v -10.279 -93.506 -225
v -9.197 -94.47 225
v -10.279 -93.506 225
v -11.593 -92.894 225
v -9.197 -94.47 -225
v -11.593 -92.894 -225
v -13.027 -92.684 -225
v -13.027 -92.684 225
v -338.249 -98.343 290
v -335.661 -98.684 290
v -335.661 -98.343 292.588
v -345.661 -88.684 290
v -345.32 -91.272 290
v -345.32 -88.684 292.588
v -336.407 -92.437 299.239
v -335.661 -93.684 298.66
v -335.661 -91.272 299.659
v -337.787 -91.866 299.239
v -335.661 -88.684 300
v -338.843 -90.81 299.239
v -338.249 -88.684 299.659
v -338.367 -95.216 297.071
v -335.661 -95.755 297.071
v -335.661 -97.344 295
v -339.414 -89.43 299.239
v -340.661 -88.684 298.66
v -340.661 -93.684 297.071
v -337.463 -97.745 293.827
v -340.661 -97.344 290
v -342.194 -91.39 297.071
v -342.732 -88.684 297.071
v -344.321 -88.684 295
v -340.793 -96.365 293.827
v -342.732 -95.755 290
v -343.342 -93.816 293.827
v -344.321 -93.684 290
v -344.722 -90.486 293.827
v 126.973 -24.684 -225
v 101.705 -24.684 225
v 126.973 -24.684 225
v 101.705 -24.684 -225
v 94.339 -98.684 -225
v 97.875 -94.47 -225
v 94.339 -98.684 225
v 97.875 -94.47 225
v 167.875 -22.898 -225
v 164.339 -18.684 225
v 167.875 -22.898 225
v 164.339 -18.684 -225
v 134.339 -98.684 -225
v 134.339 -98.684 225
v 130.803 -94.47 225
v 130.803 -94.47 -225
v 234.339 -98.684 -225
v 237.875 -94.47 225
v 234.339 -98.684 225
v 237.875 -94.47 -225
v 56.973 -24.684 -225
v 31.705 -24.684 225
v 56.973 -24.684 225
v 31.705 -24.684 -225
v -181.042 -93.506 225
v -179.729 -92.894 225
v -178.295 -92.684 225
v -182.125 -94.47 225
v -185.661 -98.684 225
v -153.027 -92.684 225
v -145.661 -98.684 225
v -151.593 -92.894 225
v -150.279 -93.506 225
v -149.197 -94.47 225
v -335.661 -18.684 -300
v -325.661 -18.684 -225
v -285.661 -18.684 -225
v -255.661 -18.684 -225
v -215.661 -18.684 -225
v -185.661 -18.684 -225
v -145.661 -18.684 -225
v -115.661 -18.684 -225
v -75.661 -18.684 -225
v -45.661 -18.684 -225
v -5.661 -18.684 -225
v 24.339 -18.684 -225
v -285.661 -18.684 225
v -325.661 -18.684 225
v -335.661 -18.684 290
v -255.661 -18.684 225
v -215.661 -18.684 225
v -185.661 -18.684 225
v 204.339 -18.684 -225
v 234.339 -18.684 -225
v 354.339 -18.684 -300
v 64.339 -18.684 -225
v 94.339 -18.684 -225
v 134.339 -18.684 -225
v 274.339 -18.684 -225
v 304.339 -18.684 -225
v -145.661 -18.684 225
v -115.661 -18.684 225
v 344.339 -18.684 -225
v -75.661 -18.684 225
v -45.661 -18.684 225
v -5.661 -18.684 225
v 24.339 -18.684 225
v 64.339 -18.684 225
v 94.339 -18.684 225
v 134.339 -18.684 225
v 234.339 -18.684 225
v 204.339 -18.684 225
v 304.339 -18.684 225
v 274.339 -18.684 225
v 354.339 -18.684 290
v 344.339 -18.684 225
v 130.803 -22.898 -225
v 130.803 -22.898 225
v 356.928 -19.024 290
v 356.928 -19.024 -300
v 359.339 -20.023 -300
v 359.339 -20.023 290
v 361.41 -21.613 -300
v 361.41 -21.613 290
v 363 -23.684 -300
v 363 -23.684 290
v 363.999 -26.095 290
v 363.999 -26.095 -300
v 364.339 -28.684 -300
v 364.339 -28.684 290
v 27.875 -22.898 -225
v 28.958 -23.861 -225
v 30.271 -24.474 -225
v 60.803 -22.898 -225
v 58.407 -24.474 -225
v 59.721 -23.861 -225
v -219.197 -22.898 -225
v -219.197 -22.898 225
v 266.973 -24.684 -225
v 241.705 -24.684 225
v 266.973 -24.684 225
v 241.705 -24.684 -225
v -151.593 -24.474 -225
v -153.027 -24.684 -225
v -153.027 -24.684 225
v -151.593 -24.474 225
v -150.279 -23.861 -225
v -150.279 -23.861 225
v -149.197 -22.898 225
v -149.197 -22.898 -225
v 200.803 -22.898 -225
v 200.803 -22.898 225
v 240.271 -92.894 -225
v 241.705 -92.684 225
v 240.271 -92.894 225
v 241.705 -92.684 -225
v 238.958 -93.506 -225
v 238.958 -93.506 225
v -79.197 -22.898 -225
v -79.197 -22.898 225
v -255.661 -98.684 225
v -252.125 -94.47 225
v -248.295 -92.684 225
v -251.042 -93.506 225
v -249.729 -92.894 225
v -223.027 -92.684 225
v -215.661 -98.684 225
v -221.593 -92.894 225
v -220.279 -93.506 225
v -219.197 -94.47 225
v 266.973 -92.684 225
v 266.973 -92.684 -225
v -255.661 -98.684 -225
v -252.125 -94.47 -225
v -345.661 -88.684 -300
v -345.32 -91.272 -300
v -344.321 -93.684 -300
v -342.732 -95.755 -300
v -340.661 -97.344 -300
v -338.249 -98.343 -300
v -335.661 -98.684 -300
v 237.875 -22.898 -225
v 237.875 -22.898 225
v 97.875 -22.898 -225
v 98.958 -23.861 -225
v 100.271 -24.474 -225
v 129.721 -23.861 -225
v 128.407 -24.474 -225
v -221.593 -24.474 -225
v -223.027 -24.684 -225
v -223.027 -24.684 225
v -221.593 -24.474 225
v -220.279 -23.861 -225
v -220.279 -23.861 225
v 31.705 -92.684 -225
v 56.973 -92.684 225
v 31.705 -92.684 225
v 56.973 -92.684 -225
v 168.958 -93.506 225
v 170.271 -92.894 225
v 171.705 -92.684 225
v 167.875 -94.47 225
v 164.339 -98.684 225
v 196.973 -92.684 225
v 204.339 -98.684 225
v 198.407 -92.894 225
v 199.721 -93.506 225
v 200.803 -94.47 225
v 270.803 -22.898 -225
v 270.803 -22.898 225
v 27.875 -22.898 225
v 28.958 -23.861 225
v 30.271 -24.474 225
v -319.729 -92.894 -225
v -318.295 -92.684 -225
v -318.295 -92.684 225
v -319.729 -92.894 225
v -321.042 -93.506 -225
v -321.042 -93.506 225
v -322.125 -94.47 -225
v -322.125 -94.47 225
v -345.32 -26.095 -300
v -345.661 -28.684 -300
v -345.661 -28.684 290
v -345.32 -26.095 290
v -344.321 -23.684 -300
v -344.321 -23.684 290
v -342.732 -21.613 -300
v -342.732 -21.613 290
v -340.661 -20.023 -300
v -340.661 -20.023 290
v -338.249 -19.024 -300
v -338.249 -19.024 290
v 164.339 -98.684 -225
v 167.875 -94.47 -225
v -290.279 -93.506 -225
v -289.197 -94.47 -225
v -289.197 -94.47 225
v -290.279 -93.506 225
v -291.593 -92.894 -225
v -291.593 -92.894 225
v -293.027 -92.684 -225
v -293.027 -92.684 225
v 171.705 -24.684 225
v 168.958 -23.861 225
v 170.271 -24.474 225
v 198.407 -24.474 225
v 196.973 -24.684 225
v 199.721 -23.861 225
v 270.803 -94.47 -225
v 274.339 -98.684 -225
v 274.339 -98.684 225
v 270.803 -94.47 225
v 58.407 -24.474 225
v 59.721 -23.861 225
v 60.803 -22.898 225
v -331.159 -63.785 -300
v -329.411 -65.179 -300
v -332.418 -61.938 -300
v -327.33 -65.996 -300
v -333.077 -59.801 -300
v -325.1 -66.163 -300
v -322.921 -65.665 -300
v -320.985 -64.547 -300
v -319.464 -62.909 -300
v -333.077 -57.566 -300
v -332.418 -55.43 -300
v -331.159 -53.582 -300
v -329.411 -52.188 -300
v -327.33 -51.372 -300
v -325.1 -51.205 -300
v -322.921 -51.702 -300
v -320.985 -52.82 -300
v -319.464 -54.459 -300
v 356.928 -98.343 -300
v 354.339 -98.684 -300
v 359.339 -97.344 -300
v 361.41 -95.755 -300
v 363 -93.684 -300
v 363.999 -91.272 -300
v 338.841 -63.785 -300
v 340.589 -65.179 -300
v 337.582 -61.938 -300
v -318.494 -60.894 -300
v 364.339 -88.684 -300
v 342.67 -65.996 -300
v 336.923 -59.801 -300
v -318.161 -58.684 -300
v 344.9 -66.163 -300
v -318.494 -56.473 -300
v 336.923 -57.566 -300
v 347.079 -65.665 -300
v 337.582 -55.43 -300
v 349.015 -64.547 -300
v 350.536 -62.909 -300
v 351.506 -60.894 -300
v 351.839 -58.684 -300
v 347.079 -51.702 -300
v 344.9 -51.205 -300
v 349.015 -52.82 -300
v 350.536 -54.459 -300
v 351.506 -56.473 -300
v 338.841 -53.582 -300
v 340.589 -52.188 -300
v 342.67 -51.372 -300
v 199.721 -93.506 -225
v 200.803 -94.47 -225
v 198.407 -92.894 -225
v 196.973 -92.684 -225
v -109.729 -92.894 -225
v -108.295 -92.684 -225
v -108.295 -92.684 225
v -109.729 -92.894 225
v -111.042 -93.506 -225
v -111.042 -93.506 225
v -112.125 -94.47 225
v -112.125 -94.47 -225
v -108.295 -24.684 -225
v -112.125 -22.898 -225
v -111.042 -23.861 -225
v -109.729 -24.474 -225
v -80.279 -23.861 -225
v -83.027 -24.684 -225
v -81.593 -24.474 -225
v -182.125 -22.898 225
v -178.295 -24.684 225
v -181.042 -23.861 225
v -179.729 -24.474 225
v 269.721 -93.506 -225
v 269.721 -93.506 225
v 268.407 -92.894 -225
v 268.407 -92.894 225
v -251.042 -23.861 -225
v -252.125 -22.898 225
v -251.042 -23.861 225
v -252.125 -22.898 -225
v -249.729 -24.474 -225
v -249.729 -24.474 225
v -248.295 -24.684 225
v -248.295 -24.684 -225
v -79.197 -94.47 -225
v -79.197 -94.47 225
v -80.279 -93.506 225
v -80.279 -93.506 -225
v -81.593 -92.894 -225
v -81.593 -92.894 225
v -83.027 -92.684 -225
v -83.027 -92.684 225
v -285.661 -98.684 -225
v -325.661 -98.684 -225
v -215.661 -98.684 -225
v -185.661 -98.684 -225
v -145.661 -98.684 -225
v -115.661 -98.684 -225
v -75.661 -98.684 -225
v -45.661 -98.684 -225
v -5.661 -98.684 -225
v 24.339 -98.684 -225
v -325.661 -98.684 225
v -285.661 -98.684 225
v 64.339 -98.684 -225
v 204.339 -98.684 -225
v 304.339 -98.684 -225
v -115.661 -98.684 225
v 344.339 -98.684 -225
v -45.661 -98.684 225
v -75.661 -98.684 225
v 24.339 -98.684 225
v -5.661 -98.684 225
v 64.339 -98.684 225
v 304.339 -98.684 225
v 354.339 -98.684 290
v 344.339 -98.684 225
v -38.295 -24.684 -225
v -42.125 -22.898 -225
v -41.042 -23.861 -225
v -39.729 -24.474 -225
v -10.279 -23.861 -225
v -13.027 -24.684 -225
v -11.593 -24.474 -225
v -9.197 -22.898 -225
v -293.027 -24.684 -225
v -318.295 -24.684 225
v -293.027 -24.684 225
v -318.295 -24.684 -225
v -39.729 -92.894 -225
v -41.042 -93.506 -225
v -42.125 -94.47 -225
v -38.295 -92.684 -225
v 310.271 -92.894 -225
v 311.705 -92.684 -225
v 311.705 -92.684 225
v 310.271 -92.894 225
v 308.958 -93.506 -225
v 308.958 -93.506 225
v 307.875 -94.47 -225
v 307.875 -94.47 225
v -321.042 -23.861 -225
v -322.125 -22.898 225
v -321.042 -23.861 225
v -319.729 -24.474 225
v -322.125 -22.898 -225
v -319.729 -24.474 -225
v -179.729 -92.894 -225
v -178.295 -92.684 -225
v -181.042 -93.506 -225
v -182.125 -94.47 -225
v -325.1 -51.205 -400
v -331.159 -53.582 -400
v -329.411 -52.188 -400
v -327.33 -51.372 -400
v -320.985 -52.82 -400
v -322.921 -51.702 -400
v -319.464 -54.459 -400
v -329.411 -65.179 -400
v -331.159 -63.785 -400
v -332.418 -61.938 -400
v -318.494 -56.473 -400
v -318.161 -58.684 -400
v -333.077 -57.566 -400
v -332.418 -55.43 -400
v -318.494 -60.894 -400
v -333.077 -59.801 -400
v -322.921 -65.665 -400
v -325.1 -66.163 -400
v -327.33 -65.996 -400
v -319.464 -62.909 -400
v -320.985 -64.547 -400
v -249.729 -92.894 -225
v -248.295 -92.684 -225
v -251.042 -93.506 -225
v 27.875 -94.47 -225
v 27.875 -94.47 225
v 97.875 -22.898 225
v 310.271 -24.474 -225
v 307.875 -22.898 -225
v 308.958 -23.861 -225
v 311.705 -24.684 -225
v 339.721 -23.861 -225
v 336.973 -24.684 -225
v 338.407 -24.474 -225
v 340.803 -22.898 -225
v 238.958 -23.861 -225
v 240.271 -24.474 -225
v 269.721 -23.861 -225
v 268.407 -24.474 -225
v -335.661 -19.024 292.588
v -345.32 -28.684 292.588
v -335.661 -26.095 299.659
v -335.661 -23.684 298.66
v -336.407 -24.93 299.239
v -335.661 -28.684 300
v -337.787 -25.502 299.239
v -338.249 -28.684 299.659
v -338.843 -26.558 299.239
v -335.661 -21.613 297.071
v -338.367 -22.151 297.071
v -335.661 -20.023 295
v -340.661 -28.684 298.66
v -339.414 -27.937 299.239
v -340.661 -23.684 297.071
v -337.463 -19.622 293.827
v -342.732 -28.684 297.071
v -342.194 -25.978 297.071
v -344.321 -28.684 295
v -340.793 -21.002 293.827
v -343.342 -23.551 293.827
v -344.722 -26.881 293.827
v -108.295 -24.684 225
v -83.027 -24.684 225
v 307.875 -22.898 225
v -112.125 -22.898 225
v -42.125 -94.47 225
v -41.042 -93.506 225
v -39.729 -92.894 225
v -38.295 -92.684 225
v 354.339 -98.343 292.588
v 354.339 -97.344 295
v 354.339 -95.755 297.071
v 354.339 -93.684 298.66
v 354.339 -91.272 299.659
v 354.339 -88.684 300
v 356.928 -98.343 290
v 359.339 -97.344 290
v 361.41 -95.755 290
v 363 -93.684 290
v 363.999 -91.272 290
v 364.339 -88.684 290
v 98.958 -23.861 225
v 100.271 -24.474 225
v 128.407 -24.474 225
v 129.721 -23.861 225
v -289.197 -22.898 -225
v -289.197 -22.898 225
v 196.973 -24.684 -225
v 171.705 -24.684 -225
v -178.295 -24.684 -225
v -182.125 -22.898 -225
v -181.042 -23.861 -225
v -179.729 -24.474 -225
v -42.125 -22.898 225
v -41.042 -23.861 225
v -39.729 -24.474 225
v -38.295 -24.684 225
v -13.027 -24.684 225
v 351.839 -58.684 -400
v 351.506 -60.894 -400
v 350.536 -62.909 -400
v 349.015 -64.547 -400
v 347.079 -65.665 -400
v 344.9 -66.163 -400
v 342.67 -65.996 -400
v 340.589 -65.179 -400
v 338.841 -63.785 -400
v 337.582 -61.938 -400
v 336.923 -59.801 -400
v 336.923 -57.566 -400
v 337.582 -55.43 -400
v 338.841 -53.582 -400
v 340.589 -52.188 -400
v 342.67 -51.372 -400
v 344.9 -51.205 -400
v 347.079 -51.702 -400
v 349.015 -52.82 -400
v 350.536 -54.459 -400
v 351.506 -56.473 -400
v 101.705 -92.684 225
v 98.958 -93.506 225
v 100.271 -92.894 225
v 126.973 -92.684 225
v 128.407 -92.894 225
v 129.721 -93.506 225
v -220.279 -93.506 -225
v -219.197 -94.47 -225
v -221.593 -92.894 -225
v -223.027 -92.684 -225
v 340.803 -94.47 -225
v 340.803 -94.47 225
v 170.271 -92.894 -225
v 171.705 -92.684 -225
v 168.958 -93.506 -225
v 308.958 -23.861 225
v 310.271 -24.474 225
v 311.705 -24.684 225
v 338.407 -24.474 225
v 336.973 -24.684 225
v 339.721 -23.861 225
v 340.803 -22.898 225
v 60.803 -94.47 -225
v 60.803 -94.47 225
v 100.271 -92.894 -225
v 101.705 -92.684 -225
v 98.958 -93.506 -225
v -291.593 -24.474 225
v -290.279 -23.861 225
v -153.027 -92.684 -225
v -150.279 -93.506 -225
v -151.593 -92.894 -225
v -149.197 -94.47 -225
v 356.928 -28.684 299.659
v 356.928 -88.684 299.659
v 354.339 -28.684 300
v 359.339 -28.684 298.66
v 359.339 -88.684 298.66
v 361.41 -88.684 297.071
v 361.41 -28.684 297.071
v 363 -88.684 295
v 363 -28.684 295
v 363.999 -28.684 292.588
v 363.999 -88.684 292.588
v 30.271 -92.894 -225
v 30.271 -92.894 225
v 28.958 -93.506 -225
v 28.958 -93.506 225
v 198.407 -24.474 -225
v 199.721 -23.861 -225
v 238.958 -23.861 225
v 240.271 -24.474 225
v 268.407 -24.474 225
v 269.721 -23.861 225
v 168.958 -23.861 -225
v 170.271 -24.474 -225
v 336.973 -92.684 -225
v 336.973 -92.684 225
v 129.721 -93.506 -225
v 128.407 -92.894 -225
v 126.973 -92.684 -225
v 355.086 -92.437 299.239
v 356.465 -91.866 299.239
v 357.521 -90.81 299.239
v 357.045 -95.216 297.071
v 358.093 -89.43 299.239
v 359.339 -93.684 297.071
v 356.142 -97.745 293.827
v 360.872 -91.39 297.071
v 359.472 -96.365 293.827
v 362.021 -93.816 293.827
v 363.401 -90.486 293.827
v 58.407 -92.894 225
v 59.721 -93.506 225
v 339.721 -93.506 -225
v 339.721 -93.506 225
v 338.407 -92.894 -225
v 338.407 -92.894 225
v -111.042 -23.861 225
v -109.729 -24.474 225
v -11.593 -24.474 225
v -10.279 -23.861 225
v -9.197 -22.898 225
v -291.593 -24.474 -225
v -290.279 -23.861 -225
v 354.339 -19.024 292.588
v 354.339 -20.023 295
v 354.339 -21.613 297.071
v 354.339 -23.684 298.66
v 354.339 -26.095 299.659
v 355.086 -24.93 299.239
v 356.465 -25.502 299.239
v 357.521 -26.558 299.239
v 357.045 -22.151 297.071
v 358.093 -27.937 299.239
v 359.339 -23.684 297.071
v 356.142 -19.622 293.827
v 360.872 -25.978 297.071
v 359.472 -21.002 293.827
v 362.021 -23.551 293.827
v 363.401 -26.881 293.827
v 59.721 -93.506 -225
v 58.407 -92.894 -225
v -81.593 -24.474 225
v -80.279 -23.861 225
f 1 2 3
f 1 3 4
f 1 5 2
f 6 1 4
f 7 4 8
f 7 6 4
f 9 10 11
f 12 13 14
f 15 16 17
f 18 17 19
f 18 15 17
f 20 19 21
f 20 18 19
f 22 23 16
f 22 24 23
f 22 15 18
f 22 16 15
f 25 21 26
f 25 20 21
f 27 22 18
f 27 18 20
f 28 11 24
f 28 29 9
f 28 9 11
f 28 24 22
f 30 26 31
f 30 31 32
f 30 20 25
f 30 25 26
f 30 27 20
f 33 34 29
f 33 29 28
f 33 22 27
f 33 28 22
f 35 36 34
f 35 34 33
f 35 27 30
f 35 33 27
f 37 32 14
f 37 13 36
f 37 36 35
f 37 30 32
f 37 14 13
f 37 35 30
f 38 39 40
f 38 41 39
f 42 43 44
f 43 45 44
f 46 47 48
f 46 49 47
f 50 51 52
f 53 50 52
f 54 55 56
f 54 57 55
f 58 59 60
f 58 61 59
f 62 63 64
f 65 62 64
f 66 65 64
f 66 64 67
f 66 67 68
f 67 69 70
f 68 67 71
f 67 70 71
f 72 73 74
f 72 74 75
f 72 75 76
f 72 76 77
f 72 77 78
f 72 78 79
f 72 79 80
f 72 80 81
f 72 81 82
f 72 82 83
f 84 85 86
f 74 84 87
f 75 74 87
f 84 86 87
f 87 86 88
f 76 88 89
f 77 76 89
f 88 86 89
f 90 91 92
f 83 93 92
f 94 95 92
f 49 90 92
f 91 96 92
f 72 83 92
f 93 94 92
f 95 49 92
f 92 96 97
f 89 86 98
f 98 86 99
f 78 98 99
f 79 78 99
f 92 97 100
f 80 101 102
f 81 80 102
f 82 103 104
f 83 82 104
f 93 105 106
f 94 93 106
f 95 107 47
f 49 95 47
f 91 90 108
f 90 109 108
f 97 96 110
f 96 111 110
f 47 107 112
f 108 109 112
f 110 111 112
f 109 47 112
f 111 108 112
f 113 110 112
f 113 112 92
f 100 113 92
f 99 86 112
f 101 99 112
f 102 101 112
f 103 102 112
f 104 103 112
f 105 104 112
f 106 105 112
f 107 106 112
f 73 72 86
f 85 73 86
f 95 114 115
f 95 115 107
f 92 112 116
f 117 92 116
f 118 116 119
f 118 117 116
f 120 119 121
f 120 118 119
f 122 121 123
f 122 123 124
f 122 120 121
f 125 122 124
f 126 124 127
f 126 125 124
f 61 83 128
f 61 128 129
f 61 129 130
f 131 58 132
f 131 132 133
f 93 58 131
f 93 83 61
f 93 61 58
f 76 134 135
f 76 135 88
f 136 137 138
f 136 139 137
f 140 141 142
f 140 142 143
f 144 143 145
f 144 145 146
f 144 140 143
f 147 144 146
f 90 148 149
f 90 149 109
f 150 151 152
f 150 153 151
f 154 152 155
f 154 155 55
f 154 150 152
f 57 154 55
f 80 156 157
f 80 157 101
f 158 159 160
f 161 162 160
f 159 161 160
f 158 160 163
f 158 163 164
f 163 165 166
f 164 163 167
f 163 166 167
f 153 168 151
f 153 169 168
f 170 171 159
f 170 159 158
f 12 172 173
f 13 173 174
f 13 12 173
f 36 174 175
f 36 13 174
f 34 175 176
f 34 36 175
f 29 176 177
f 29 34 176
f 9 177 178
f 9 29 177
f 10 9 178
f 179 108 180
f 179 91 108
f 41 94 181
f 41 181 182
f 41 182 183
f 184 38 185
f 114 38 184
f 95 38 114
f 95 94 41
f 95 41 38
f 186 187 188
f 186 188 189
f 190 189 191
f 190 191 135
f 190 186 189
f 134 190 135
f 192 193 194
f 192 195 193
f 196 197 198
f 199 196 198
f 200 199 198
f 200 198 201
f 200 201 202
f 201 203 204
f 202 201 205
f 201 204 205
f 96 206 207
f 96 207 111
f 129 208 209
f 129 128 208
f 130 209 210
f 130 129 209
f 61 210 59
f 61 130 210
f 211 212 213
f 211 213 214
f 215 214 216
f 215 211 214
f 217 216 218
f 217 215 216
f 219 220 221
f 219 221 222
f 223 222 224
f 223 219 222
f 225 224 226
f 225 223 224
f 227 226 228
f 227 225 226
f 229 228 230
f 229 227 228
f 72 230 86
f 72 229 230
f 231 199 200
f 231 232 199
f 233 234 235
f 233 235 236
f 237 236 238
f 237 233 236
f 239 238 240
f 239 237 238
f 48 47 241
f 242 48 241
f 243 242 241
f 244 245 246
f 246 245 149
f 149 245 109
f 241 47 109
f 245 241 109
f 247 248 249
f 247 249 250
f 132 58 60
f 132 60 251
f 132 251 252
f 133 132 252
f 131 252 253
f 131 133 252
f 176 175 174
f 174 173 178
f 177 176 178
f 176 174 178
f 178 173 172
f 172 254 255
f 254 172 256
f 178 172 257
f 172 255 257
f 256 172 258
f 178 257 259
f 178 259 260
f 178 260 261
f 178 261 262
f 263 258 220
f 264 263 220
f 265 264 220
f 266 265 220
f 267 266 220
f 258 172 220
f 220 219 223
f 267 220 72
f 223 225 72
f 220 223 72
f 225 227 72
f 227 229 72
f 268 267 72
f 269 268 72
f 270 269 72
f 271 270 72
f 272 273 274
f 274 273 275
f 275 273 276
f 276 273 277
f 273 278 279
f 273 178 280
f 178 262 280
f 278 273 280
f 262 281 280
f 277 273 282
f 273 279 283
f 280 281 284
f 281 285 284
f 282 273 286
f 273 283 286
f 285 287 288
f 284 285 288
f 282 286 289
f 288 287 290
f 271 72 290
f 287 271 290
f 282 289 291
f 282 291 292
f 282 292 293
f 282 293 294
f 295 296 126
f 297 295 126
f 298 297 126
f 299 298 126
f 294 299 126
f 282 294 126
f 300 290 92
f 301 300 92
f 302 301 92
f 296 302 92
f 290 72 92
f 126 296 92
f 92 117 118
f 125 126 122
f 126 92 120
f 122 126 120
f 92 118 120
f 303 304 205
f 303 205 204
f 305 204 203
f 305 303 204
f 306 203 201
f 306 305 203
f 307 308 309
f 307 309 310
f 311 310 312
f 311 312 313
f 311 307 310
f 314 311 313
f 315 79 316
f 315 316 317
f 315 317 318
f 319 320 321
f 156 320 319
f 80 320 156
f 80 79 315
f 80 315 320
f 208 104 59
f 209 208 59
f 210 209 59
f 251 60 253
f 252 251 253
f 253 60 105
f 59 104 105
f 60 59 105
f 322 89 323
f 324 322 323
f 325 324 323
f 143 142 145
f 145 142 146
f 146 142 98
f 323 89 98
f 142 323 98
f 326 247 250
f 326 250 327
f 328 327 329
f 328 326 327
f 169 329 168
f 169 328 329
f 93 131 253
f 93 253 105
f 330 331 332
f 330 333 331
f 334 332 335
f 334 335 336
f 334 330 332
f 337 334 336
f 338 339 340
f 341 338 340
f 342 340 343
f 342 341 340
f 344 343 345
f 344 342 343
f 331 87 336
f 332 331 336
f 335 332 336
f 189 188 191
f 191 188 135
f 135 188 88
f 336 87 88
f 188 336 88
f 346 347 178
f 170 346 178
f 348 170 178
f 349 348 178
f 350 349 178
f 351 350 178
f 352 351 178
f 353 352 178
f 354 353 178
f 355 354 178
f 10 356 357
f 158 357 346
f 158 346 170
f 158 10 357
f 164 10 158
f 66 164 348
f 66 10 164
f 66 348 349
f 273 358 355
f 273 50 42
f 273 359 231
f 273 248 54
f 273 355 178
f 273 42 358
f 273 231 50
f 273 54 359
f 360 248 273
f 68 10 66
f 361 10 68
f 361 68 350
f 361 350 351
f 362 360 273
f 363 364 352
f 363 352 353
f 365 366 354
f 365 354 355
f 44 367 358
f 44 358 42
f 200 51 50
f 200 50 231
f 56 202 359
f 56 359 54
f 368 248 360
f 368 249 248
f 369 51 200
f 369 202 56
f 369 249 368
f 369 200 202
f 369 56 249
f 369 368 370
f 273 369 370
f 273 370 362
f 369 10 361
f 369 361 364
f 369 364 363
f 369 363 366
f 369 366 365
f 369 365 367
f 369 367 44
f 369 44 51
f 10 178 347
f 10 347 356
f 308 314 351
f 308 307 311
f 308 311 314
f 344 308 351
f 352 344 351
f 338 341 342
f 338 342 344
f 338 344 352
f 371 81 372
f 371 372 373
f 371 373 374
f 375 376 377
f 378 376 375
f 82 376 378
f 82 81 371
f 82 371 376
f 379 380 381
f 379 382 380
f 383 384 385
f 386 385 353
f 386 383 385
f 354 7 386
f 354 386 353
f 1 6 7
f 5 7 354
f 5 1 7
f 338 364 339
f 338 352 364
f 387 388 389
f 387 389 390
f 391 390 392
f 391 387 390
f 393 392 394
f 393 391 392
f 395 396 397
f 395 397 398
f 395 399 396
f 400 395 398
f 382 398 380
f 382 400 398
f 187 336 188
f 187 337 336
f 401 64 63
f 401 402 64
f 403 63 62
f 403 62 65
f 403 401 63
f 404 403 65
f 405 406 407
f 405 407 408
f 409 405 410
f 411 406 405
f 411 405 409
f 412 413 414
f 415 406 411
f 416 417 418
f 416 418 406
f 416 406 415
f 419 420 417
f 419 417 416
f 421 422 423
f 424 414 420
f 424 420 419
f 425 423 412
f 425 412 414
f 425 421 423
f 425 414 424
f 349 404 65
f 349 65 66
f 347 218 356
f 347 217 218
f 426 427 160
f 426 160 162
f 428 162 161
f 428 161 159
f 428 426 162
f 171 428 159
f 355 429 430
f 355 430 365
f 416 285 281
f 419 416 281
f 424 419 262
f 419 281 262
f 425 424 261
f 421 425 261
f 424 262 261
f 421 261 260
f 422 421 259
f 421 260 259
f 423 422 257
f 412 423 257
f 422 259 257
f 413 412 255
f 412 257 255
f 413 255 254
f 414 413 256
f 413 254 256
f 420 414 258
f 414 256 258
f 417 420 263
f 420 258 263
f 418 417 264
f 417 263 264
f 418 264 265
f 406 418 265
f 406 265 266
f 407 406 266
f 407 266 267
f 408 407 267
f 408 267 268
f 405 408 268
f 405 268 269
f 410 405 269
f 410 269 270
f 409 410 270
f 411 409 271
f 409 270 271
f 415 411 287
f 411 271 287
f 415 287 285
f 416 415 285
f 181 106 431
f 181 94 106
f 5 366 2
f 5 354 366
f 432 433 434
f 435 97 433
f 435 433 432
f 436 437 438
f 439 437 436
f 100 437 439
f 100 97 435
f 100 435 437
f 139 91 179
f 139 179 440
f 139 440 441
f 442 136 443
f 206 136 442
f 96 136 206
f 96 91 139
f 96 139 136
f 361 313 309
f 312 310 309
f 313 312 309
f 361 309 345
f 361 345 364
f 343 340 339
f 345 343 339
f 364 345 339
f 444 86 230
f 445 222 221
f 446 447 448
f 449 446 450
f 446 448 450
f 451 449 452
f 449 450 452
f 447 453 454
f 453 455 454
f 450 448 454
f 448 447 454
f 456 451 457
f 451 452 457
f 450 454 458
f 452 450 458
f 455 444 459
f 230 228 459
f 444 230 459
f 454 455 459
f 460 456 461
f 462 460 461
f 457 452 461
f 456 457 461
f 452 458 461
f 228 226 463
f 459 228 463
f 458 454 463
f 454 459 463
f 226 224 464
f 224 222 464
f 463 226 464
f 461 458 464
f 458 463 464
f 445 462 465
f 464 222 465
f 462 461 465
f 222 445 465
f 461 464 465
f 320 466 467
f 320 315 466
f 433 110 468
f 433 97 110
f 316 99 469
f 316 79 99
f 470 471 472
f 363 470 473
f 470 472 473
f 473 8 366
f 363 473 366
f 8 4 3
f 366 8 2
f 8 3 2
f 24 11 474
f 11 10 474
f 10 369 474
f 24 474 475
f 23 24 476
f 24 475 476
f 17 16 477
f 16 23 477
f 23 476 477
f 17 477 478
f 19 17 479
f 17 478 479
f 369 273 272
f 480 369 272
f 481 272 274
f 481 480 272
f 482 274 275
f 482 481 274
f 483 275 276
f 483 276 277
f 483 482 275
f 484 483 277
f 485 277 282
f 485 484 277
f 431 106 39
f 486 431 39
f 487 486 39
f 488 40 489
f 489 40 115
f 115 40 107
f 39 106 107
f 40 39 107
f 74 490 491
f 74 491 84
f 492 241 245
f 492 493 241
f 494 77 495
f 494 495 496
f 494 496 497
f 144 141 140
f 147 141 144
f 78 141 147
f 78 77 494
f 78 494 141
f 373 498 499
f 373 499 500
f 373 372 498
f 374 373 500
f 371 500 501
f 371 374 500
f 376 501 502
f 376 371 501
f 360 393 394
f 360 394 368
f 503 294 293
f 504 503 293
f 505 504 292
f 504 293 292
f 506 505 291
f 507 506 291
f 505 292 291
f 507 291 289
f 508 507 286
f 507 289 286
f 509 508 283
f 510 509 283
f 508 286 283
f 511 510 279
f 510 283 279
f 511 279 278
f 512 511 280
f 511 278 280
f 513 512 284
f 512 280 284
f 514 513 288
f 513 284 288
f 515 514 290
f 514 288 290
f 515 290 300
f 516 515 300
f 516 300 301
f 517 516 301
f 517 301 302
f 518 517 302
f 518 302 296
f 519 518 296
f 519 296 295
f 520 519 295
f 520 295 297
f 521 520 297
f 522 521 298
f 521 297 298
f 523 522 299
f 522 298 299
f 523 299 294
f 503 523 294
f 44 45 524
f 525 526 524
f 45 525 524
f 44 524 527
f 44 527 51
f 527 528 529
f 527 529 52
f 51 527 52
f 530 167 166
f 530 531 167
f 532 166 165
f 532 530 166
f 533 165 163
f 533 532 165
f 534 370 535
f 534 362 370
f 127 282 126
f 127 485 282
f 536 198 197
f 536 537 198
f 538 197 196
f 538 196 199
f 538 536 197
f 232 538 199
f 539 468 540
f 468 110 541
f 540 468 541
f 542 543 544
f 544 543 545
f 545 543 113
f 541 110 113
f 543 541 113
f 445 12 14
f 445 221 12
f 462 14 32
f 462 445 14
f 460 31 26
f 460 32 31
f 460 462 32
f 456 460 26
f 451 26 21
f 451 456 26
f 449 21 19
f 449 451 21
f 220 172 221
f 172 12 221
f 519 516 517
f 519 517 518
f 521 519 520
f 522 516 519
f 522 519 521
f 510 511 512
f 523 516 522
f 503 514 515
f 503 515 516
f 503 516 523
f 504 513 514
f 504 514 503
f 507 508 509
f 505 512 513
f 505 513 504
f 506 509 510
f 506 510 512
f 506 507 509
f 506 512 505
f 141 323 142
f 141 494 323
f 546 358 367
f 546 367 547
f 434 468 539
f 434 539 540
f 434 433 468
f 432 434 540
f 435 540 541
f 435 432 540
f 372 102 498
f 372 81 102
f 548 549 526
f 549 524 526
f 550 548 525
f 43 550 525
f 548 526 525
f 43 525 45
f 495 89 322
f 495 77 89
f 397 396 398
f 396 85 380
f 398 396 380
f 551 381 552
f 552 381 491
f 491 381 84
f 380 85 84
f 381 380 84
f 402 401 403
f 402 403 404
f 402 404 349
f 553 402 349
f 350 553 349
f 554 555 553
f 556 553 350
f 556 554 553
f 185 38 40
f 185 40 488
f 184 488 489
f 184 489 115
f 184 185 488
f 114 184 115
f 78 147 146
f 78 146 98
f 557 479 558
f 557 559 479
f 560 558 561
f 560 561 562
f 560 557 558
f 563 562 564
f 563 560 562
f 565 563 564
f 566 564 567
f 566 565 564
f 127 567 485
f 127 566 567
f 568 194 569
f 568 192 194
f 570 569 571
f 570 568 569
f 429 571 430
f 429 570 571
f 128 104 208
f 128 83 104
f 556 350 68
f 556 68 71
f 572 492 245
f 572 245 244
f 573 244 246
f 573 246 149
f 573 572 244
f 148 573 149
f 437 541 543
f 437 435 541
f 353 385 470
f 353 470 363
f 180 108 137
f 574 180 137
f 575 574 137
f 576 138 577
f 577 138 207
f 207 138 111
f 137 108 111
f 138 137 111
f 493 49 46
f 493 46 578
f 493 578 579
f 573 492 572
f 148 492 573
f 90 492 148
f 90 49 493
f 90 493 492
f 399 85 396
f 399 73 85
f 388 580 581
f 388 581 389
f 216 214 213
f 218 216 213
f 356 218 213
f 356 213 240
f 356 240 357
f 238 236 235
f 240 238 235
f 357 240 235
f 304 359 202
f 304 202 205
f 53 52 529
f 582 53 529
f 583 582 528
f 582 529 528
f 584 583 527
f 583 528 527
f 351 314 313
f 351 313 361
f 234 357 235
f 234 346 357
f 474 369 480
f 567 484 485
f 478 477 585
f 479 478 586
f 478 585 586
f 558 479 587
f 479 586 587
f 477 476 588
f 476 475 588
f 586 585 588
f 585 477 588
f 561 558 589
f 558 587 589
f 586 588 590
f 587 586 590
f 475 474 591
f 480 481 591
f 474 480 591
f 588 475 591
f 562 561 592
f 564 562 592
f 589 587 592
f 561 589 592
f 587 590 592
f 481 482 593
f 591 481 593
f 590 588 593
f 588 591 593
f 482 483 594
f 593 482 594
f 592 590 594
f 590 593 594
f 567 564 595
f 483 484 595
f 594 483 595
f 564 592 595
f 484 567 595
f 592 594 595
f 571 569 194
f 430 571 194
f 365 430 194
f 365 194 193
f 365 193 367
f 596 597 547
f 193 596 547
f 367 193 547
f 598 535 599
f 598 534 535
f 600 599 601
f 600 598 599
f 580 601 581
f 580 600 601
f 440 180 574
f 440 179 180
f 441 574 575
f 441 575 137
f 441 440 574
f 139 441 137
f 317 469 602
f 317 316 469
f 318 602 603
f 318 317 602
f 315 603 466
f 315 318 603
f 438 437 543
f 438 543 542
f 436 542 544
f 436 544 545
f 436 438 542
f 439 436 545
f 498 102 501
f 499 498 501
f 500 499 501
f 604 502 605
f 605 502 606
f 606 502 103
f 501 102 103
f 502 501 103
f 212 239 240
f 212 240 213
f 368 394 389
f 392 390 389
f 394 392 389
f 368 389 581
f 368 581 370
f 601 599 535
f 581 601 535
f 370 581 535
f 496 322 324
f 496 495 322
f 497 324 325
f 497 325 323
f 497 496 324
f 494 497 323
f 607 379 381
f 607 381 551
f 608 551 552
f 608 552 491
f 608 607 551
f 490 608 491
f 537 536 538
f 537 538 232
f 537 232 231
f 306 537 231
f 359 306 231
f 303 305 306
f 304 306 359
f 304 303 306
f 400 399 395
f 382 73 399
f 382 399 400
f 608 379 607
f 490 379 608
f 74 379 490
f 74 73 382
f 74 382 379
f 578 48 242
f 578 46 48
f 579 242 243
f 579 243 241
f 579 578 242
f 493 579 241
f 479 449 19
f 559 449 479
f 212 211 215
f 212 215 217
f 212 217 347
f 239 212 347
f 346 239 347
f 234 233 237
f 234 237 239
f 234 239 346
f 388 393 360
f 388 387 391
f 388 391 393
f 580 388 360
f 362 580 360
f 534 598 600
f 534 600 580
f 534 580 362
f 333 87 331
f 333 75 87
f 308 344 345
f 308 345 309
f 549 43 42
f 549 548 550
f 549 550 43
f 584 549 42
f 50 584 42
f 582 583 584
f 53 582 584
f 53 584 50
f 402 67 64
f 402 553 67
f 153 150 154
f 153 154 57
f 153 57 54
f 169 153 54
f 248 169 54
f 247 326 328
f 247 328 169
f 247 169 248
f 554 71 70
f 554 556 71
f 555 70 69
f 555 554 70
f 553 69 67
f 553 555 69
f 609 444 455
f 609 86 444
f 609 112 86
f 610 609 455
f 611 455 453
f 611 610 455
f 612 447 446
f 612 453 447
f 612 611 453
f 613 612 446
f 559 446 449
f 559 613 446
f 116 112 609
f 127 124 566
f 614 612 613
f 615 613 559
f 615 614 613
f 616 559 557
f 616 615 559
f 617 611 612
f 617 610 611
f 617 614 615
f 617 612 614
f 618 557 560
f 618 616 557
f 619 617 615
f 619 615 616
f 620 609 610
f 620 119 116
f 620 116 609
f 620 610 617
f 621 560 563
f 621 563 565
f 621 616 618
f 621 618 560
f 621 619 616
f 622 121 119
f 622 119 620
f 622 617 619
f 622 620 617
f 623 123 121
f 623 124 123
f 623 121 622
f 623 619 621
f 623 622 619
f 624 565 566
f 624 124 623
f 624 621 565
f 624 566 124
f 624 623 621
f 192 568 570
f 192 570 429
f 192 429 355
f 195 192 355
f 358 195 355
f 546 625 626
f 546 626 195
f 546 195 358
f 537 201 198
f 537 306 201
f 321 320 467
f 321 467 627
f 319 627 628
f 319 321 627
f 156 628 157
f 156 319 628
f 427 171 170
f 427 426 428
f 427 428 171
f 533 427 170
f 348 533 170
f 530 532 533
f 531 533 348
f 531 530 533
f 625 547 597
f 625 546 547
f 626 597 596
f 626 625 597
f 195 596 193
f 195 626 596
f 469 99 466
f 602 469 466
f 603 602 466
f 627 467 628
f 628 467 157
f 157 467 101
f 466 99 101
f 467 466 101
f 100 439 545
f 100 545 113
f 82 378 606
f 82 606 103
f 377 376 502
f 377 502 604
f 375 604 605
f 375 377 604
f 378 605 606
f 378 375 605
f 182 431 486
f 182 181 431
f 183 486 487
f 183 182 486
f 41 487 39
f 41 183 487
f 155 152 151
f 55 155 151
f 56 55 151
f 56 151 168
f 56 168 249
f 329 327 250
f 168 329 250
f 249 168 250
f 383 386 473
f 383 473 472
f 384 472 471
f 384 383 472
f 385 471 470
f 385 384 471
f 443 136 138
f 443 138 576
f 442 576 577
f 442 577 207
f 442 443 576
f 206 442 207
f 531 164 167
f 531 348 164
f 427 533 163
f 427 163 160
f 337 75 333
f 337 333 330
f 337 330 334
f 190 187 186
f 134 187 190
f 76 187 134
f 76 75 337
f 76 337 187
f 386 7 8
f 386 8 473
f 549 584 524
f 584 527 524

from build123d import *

# Parameters (mm, degrees)
F0_W     = 710
F0_H     = 80
F1_DEPTH = 300
F2_R     = 7.5
F3_DEPTH = 100
F5_DEPTH = 225
F6_R     = 10


with BuildPart() as f1:
    # F0 (on Top) → F1 (new body, symmetric)
    with BuildSketch(Plane.XY):
        with Locations((9.33931, -58.683639)):
            Rectangle(F0_W, F0_H)
    extrude(amount=F1_DEPTH, both=True)

    # F2 (on face) → F3 (join)
    with BuildSketch(Plane(origin=(0, 0, -300), x_dir=(1, 0, 0), z_dir=(0, 0, -1))):
        with Locations((344.33931, 58.683639)):
            Circle(F2_R)
        with Locations((-325.66069, 58.683639)):
            Circle(F2_R)
    extrude(amount=F3_DEPTH)

    # F4 (on Top) → F5 (cut, symmetric)
    with BuildSketch(Plane.XY):
        with BuildLine():
            Line((-285.66069, -18.683639), (-325.66069, -18.683639))
            Line((-325.66069, -18.683639), (-322.124776, -22.897577))
            ThreePointArc((-322.124776, -22.897577), (-320.407645, -24.215178), (-318.294554, -24.683639))
            Line((-318.294554, -24.683639), (-293.026826, -24.683639))
            ThreePointArc((-293.026826, -24.683639), (-290.913735, -24.215178), (-289.196604, -22.897577))
            Line((-289.196604, -22.897577), (-285.66069, -18.683639))
        make_face()
        with BuildLine():
            Line((-215.66069, -18.683639), (-255.66069, -18.683639))
            Line((-255.66069, -18.683639), (-252.124776, -22.897577))
            ThreePointArc((-252.124776, -22.897577), (-250.407645, -24.215178), (-248.294554, -24.683639))
            Line((-248.294554, -24.683639), (-223.026826, -24.683639))
            ThreePointArc((-223.026826, -24.683639), (-220.913735, -24.215178), (-219.196604, -22.897577))
            Line((-219.196604, -22.897577), (-215.66069, -18.683639))
        make_face()
        with BuildLine():
            Line((-145.66069, -18.683639), (-185.66069, -18.683639))
            Line((-185.66069, -18.683639), (-182.124776, -22.897577))
            ThreePointArc((-182.124776, -22.897577), (-180.407645, -24.215178), (-178.294554, -24.683639))
            Line((-178.294554, -24.683639), (-153.026826, -24.683639))
            ThreePointArc((-153.026826, -24.683639), (-150.913735, -24.215178), (-149.196604, -22.897577))
            Line((-149.196604, -22.897577), (-145.66069, -18.683639))
        make_face()
        with BuildLine():
            Line((-75.66069, -18.683639), (-115.66069, -18.683639))
            Line((-115.66069, -18.683639), (-112.124776, -22.897577))
            ThreePointArc((-112.124776, -22.897577), (-110.407645, -24.215178), (-108.294554, -24.683639))
            Line((-108.294554, -24.683639), (-83.026826, -24.683639))
            ThreePointArc((-83.026826, -24.683639), (-80.913735, -24.215178), (-79.196604, -22.897577))
            Line((-79.196604, -22.897577), (-75.66069, -18.683639))
        make_face()
        with BuildLine():
            Line((-5.66069, -18.683639), (-45.66069, -18.683639))
            Line((-45.66069, -18.683639), (-42.124776, -22.897577))
            ThreePointArc((-42.124776, -22.897577), (-40.407645, -24.215178), (-38.294554, -24.683639))
            Line((-38.294554, -24.683639), (-13.026826, -24.683639))
            ThreePointArc((-13.026826, -24.683639), (-10.913735, -24.215178), (-9.196604, -22.897577))
            Line((-9.196604, -22.897577), (-5.66069, -18.683639))
        make_face()
        with BuildLine():
            Line((64.33931, -18.683639), (24.33931, -18.683639))
            Line((24.33931, -18.683639), (27.875224, -22.897577))
            ThreePointArc((27.875224, -22.897577), (29.592355, -24.215178), (31.705446, -24.683639))
            Line((31.705446, -24.683639), (56.973174, -24.683639))
            ThreePointArc((56.973174, -24.683639), (59.086265, -24.215178), (60.803396, -22.897577))
            Line((60.803396, -22.897577), (64.33931, -18.683639))
        make_face()
        with BuildLine():
            Line((134.33931, -18.683639), (94.33931, -18.683639))
            Line((94.33931, -18.683639), (97.875224, -22.897577))
            ThreePointArc((97.875224, -22.897577), (99.592355, -24.215178), (101.705446, -24.683639))
            Line((101.705446, -24.683639), (126.973174, -24.683639))
            ThreePointArc((126.973174, -24.683639), (129.086265, -24.215178), (130.803396, -22.897577))
            Line((130.803396, -22.897577), (134.33931, -18.683639))
        make_face()
        with BuildLine():
            Line((204.33931, -18.683639), (164.33931, -18.683639))
            Line((164.33931, -18.683639), (167.875224, -22.897577))
            ThreePointArc((167.875224, -22.897577), (169.592355, -24.215178), (171.705446, -24.683639))
            Line((171.705446, -24.683639), (196.973174, -24.683639))
            ThreePointArc((196.973174, -24.683639), (199.086265, -24.215178), (200.803396, -22.897577))
            Line((200.803396, -22.897577), (204.33931, -18.683639))
        make_face()
        with BuildLine():
            Line((274.33931, -18.683639), (234.33931, -18.683639))
            Line((234.33931, -18.683639), (237.875224, -22.897577))
            ThreePointArc((237.875224, -22.897577), (239.592355, -24.215178), (241.705446, -24.683639))
            Line((241.705446, -24.683639), (266.973174, -24.683639))
            ThreePointArc((266.973174, -24.683639), (269.086265, -24.215178), (270.803396, -22.897577))
            Line((270.803396, -22.897577), (274.33931, -18.683639))
        make_face()
        with BuildLine():
            Line((344.33931, -18.683639), (304.33931, -18.683639))
            Line((304.33931, -18.683639), (307.875224, -22.897577))
            ThreePointArc((307.875224, -22.897577), (309.592355, -24.215178), (311.705446, -24.683639))
            Line((311.705446, -24.683639), (336.973174, -24.683639))
            ThreePointArc((336.973174, -24.683639), (339.086265, -24.215178), (340.803396, -22.897577))
            Line((340.803396, -22.897577), (344.33931, -18.683639))
        make_face()
        with BuildLine():
            ThreePointArc((-318.294554, -92.683639), (-320.407645, -93.1521), (-322.124776, -94.469701))
            Line((-322.124776, -94.469701), (-325.66069, -98.683639))
            Line((-325.66069, -98.683639), (-285.66069, -98.683639))
            Line((-285.66069, -98.683639), (-289.196604, -94.469701))
            ThreePointArc((-289.196604, -94.469701), (-290.913735, -93.1521), (-293.026826, -92.683639))
            Line((-293.026826, -92.683639), (-318.294554, -92.683639))
        make_face()
        with BuildLine():
            Line((-252.124776, -94.469701), (-255.66069, -98.683639))
            Line((-255.66069, -98.683639), (-215.66069, -98.683639))
            Line((-215.66069, -98.683639), (-219.196604, -94.469701))
            ThreePointArc((-219.196604, -94.469701), (-220.913735, -93.1521), (-223.026826, -92.683639))
            Line((-223.026826, -92.683639), (-248.294554, -92.683639))
            ThreePointArc((-248.294554, -92.683639), (-250.407645, -93.1521), (-252.124776, -94.469701))
        make_face()
        with BuildLine():
            ThreePointArc((200.803396, -94.469701), (199.086265, -93.1521), (196.973174, -92.683639))
            Line((196.973174, -92.683639), (171.705446, -92.683639))
            ThreePointArc((171.705446, -92.683639), (169.592355, -93.1521), (167.875224, -94.469701))
            Line((167.875224, -94.469701), (164.33931, -98.683639))
            Line((164.33931, -98.683639), (204.33931, -98.683639))
            Line((204.33931, -98.683639), (200.803396, -94.469701))
        make_face()
        with BuildLine():
            Line((-112.124776, -94.469701), (-115.66069, -98.683639))
            Line((-115.66069, -98.683639), (-75.66069, -98.683639))
            Line((-75.66069, -98.683639), (-79.196604, -94.469701))
            ThreePointArc((-79.196604, -94.469701), (-80.913735, -93.1521), (-83.026826, -92.683639))
            Line((-83.026826, -92.683639), (-108.294554, -92.683639))
            ThreePointArc((-108.294554, -92.683639), (-110.407645, -93.1521), (-112.124776, -94.469701))
        make_face()
        with BuildLine():
            Line((-145.66069, -98.683639), (-149.196604, -94.469701))
            ThreePointArc((-149.196604, -94.469701), (-150.913735, -93.1521), (-153.026826, -92.683639))
            Line((-153.026826, -92.683639), (-178.294554, -92.683639))
            ThreePointArc((-178.294554, -92.683639), (-180.407645, -93.1521), (-182.124776, -94.469701))
            Line((-182.124776, -94.469701), (-185.66069, -98.683639))
            Line((-185.66069, -98.683639), (-145.66069, -98.683639))
        make_face()
        with BuildLine():
            Line((307.875224, -94.469701), (304.33931, -98.683639))
            Line((304.33931, -98.683639), (344.33931, -98.683639))
            Line((344.33931, -98.683639), (340.803396, -94.469701))
            ThreePointArc((340.803396, -94.469701), (339.086265, -93.1521), (336.973174, -92.683639))
            Line((336.973174, -92.683639), (311.705446, -92.683639))
            ThreePointArc((311.705446, -92.683639), (309.592355, -93.1521), (307.875224, -94.469701))
        make_face()
        with BuildLine():
            Line((-42.124776, -94.469701), (-45.66069, -98.683639))
            Line((-45.66069, -98.683639), (-5.66069, -98.683639))
            Line((-5.66069, -98.683639), (-9.196604, -94.469701))
            ThreePointArc((-9.196604, -94.469701), (-10.913735, -93.1521), (-13.026826, -92.683639))
            Line((-13.026826, -92.683639), (-38.294554, -92.683639))
            ThreePointArc((-38.294554, -92.683639), (-40.407645, -93.1521), (-42.124776, -94.469701))
        make_face()
        with BuildLine():
            Line((64.33931, -98.683639), (60.803396, -94.469701))
            ThreePointArc((60.803396, -94.469701), (59.086265, -93.1521), (56.973174, -92.683639))
            Line((56.973174, -92.683639), (31.705446, -92.683639))
            ThreePointArc((31.705446, -92.683639), (29.592355, -93.1521), (27.875224, -94.469701))
            Line((27.875224, -94.469701), (24.33931, -98.683639))
            Line((24.33931, -98.683639), (64.33931, -98.683639))
        make_face()
        with BuildLine():
            ThreePointArc((270.803396, -94.469701), (269.086265, -93.1521), (266.973174, -92.683639))
            Line((266.973174, -92.683639), (241.705446, -92.683639))
            ThreePointArc((241.705446, -92.683639), (239.592355, -93.1521), (237.875224, -94.469701))
            Line((237.875224, -94.469701), (234.33931, -98.683639))
            Line((234.33931, -98.683639), (274.33931, -98.683639))
            Line((274.33931, -98.683639), (270.803396, -94.469701))
        make_face()
        with BuildLine():
            Line((97.875224, -94.469701), (94.33931, -98.683639))
            Line((94.33931, -98.683639), (134.33931, -98.683639))
            Line((134.33931, -98.683639), (130.803396, -94.469701))
            ThreePointArc((130.803396, -94.469701), (129.086265, -93.1521), (126.973174, -92.683639))
            Line((126.973174, -92.683639), (101.705446, -92.683639))
            ThreePointArc((101.705446, -92.683639), (99.592355, -93.1521), (97.875224, -94.469701))
        make_face()
    extrude(amount=F5_DEPTH, both=True, mode=Mode.SUBTRACT)

    # F6
    f6_edges = [f1.edges().sort_by_distance(p)[0] for p in [
        (-345.66069, -98.683639, 0),
        (-345.66069, -18.683639, 0),
        (364.33931, -98.683639, 0),
        (364.33931, -18.683639, 0),
        (9.33931, -98.683639, 300),
        (9.33931, -18.683639, 300),
        (364.33931, -58.683639, 300),
        (-345.66069, -58.683639, 300),
    ]]
    fillet(f6_edges, radius=F6_R)


solid = f1.part
